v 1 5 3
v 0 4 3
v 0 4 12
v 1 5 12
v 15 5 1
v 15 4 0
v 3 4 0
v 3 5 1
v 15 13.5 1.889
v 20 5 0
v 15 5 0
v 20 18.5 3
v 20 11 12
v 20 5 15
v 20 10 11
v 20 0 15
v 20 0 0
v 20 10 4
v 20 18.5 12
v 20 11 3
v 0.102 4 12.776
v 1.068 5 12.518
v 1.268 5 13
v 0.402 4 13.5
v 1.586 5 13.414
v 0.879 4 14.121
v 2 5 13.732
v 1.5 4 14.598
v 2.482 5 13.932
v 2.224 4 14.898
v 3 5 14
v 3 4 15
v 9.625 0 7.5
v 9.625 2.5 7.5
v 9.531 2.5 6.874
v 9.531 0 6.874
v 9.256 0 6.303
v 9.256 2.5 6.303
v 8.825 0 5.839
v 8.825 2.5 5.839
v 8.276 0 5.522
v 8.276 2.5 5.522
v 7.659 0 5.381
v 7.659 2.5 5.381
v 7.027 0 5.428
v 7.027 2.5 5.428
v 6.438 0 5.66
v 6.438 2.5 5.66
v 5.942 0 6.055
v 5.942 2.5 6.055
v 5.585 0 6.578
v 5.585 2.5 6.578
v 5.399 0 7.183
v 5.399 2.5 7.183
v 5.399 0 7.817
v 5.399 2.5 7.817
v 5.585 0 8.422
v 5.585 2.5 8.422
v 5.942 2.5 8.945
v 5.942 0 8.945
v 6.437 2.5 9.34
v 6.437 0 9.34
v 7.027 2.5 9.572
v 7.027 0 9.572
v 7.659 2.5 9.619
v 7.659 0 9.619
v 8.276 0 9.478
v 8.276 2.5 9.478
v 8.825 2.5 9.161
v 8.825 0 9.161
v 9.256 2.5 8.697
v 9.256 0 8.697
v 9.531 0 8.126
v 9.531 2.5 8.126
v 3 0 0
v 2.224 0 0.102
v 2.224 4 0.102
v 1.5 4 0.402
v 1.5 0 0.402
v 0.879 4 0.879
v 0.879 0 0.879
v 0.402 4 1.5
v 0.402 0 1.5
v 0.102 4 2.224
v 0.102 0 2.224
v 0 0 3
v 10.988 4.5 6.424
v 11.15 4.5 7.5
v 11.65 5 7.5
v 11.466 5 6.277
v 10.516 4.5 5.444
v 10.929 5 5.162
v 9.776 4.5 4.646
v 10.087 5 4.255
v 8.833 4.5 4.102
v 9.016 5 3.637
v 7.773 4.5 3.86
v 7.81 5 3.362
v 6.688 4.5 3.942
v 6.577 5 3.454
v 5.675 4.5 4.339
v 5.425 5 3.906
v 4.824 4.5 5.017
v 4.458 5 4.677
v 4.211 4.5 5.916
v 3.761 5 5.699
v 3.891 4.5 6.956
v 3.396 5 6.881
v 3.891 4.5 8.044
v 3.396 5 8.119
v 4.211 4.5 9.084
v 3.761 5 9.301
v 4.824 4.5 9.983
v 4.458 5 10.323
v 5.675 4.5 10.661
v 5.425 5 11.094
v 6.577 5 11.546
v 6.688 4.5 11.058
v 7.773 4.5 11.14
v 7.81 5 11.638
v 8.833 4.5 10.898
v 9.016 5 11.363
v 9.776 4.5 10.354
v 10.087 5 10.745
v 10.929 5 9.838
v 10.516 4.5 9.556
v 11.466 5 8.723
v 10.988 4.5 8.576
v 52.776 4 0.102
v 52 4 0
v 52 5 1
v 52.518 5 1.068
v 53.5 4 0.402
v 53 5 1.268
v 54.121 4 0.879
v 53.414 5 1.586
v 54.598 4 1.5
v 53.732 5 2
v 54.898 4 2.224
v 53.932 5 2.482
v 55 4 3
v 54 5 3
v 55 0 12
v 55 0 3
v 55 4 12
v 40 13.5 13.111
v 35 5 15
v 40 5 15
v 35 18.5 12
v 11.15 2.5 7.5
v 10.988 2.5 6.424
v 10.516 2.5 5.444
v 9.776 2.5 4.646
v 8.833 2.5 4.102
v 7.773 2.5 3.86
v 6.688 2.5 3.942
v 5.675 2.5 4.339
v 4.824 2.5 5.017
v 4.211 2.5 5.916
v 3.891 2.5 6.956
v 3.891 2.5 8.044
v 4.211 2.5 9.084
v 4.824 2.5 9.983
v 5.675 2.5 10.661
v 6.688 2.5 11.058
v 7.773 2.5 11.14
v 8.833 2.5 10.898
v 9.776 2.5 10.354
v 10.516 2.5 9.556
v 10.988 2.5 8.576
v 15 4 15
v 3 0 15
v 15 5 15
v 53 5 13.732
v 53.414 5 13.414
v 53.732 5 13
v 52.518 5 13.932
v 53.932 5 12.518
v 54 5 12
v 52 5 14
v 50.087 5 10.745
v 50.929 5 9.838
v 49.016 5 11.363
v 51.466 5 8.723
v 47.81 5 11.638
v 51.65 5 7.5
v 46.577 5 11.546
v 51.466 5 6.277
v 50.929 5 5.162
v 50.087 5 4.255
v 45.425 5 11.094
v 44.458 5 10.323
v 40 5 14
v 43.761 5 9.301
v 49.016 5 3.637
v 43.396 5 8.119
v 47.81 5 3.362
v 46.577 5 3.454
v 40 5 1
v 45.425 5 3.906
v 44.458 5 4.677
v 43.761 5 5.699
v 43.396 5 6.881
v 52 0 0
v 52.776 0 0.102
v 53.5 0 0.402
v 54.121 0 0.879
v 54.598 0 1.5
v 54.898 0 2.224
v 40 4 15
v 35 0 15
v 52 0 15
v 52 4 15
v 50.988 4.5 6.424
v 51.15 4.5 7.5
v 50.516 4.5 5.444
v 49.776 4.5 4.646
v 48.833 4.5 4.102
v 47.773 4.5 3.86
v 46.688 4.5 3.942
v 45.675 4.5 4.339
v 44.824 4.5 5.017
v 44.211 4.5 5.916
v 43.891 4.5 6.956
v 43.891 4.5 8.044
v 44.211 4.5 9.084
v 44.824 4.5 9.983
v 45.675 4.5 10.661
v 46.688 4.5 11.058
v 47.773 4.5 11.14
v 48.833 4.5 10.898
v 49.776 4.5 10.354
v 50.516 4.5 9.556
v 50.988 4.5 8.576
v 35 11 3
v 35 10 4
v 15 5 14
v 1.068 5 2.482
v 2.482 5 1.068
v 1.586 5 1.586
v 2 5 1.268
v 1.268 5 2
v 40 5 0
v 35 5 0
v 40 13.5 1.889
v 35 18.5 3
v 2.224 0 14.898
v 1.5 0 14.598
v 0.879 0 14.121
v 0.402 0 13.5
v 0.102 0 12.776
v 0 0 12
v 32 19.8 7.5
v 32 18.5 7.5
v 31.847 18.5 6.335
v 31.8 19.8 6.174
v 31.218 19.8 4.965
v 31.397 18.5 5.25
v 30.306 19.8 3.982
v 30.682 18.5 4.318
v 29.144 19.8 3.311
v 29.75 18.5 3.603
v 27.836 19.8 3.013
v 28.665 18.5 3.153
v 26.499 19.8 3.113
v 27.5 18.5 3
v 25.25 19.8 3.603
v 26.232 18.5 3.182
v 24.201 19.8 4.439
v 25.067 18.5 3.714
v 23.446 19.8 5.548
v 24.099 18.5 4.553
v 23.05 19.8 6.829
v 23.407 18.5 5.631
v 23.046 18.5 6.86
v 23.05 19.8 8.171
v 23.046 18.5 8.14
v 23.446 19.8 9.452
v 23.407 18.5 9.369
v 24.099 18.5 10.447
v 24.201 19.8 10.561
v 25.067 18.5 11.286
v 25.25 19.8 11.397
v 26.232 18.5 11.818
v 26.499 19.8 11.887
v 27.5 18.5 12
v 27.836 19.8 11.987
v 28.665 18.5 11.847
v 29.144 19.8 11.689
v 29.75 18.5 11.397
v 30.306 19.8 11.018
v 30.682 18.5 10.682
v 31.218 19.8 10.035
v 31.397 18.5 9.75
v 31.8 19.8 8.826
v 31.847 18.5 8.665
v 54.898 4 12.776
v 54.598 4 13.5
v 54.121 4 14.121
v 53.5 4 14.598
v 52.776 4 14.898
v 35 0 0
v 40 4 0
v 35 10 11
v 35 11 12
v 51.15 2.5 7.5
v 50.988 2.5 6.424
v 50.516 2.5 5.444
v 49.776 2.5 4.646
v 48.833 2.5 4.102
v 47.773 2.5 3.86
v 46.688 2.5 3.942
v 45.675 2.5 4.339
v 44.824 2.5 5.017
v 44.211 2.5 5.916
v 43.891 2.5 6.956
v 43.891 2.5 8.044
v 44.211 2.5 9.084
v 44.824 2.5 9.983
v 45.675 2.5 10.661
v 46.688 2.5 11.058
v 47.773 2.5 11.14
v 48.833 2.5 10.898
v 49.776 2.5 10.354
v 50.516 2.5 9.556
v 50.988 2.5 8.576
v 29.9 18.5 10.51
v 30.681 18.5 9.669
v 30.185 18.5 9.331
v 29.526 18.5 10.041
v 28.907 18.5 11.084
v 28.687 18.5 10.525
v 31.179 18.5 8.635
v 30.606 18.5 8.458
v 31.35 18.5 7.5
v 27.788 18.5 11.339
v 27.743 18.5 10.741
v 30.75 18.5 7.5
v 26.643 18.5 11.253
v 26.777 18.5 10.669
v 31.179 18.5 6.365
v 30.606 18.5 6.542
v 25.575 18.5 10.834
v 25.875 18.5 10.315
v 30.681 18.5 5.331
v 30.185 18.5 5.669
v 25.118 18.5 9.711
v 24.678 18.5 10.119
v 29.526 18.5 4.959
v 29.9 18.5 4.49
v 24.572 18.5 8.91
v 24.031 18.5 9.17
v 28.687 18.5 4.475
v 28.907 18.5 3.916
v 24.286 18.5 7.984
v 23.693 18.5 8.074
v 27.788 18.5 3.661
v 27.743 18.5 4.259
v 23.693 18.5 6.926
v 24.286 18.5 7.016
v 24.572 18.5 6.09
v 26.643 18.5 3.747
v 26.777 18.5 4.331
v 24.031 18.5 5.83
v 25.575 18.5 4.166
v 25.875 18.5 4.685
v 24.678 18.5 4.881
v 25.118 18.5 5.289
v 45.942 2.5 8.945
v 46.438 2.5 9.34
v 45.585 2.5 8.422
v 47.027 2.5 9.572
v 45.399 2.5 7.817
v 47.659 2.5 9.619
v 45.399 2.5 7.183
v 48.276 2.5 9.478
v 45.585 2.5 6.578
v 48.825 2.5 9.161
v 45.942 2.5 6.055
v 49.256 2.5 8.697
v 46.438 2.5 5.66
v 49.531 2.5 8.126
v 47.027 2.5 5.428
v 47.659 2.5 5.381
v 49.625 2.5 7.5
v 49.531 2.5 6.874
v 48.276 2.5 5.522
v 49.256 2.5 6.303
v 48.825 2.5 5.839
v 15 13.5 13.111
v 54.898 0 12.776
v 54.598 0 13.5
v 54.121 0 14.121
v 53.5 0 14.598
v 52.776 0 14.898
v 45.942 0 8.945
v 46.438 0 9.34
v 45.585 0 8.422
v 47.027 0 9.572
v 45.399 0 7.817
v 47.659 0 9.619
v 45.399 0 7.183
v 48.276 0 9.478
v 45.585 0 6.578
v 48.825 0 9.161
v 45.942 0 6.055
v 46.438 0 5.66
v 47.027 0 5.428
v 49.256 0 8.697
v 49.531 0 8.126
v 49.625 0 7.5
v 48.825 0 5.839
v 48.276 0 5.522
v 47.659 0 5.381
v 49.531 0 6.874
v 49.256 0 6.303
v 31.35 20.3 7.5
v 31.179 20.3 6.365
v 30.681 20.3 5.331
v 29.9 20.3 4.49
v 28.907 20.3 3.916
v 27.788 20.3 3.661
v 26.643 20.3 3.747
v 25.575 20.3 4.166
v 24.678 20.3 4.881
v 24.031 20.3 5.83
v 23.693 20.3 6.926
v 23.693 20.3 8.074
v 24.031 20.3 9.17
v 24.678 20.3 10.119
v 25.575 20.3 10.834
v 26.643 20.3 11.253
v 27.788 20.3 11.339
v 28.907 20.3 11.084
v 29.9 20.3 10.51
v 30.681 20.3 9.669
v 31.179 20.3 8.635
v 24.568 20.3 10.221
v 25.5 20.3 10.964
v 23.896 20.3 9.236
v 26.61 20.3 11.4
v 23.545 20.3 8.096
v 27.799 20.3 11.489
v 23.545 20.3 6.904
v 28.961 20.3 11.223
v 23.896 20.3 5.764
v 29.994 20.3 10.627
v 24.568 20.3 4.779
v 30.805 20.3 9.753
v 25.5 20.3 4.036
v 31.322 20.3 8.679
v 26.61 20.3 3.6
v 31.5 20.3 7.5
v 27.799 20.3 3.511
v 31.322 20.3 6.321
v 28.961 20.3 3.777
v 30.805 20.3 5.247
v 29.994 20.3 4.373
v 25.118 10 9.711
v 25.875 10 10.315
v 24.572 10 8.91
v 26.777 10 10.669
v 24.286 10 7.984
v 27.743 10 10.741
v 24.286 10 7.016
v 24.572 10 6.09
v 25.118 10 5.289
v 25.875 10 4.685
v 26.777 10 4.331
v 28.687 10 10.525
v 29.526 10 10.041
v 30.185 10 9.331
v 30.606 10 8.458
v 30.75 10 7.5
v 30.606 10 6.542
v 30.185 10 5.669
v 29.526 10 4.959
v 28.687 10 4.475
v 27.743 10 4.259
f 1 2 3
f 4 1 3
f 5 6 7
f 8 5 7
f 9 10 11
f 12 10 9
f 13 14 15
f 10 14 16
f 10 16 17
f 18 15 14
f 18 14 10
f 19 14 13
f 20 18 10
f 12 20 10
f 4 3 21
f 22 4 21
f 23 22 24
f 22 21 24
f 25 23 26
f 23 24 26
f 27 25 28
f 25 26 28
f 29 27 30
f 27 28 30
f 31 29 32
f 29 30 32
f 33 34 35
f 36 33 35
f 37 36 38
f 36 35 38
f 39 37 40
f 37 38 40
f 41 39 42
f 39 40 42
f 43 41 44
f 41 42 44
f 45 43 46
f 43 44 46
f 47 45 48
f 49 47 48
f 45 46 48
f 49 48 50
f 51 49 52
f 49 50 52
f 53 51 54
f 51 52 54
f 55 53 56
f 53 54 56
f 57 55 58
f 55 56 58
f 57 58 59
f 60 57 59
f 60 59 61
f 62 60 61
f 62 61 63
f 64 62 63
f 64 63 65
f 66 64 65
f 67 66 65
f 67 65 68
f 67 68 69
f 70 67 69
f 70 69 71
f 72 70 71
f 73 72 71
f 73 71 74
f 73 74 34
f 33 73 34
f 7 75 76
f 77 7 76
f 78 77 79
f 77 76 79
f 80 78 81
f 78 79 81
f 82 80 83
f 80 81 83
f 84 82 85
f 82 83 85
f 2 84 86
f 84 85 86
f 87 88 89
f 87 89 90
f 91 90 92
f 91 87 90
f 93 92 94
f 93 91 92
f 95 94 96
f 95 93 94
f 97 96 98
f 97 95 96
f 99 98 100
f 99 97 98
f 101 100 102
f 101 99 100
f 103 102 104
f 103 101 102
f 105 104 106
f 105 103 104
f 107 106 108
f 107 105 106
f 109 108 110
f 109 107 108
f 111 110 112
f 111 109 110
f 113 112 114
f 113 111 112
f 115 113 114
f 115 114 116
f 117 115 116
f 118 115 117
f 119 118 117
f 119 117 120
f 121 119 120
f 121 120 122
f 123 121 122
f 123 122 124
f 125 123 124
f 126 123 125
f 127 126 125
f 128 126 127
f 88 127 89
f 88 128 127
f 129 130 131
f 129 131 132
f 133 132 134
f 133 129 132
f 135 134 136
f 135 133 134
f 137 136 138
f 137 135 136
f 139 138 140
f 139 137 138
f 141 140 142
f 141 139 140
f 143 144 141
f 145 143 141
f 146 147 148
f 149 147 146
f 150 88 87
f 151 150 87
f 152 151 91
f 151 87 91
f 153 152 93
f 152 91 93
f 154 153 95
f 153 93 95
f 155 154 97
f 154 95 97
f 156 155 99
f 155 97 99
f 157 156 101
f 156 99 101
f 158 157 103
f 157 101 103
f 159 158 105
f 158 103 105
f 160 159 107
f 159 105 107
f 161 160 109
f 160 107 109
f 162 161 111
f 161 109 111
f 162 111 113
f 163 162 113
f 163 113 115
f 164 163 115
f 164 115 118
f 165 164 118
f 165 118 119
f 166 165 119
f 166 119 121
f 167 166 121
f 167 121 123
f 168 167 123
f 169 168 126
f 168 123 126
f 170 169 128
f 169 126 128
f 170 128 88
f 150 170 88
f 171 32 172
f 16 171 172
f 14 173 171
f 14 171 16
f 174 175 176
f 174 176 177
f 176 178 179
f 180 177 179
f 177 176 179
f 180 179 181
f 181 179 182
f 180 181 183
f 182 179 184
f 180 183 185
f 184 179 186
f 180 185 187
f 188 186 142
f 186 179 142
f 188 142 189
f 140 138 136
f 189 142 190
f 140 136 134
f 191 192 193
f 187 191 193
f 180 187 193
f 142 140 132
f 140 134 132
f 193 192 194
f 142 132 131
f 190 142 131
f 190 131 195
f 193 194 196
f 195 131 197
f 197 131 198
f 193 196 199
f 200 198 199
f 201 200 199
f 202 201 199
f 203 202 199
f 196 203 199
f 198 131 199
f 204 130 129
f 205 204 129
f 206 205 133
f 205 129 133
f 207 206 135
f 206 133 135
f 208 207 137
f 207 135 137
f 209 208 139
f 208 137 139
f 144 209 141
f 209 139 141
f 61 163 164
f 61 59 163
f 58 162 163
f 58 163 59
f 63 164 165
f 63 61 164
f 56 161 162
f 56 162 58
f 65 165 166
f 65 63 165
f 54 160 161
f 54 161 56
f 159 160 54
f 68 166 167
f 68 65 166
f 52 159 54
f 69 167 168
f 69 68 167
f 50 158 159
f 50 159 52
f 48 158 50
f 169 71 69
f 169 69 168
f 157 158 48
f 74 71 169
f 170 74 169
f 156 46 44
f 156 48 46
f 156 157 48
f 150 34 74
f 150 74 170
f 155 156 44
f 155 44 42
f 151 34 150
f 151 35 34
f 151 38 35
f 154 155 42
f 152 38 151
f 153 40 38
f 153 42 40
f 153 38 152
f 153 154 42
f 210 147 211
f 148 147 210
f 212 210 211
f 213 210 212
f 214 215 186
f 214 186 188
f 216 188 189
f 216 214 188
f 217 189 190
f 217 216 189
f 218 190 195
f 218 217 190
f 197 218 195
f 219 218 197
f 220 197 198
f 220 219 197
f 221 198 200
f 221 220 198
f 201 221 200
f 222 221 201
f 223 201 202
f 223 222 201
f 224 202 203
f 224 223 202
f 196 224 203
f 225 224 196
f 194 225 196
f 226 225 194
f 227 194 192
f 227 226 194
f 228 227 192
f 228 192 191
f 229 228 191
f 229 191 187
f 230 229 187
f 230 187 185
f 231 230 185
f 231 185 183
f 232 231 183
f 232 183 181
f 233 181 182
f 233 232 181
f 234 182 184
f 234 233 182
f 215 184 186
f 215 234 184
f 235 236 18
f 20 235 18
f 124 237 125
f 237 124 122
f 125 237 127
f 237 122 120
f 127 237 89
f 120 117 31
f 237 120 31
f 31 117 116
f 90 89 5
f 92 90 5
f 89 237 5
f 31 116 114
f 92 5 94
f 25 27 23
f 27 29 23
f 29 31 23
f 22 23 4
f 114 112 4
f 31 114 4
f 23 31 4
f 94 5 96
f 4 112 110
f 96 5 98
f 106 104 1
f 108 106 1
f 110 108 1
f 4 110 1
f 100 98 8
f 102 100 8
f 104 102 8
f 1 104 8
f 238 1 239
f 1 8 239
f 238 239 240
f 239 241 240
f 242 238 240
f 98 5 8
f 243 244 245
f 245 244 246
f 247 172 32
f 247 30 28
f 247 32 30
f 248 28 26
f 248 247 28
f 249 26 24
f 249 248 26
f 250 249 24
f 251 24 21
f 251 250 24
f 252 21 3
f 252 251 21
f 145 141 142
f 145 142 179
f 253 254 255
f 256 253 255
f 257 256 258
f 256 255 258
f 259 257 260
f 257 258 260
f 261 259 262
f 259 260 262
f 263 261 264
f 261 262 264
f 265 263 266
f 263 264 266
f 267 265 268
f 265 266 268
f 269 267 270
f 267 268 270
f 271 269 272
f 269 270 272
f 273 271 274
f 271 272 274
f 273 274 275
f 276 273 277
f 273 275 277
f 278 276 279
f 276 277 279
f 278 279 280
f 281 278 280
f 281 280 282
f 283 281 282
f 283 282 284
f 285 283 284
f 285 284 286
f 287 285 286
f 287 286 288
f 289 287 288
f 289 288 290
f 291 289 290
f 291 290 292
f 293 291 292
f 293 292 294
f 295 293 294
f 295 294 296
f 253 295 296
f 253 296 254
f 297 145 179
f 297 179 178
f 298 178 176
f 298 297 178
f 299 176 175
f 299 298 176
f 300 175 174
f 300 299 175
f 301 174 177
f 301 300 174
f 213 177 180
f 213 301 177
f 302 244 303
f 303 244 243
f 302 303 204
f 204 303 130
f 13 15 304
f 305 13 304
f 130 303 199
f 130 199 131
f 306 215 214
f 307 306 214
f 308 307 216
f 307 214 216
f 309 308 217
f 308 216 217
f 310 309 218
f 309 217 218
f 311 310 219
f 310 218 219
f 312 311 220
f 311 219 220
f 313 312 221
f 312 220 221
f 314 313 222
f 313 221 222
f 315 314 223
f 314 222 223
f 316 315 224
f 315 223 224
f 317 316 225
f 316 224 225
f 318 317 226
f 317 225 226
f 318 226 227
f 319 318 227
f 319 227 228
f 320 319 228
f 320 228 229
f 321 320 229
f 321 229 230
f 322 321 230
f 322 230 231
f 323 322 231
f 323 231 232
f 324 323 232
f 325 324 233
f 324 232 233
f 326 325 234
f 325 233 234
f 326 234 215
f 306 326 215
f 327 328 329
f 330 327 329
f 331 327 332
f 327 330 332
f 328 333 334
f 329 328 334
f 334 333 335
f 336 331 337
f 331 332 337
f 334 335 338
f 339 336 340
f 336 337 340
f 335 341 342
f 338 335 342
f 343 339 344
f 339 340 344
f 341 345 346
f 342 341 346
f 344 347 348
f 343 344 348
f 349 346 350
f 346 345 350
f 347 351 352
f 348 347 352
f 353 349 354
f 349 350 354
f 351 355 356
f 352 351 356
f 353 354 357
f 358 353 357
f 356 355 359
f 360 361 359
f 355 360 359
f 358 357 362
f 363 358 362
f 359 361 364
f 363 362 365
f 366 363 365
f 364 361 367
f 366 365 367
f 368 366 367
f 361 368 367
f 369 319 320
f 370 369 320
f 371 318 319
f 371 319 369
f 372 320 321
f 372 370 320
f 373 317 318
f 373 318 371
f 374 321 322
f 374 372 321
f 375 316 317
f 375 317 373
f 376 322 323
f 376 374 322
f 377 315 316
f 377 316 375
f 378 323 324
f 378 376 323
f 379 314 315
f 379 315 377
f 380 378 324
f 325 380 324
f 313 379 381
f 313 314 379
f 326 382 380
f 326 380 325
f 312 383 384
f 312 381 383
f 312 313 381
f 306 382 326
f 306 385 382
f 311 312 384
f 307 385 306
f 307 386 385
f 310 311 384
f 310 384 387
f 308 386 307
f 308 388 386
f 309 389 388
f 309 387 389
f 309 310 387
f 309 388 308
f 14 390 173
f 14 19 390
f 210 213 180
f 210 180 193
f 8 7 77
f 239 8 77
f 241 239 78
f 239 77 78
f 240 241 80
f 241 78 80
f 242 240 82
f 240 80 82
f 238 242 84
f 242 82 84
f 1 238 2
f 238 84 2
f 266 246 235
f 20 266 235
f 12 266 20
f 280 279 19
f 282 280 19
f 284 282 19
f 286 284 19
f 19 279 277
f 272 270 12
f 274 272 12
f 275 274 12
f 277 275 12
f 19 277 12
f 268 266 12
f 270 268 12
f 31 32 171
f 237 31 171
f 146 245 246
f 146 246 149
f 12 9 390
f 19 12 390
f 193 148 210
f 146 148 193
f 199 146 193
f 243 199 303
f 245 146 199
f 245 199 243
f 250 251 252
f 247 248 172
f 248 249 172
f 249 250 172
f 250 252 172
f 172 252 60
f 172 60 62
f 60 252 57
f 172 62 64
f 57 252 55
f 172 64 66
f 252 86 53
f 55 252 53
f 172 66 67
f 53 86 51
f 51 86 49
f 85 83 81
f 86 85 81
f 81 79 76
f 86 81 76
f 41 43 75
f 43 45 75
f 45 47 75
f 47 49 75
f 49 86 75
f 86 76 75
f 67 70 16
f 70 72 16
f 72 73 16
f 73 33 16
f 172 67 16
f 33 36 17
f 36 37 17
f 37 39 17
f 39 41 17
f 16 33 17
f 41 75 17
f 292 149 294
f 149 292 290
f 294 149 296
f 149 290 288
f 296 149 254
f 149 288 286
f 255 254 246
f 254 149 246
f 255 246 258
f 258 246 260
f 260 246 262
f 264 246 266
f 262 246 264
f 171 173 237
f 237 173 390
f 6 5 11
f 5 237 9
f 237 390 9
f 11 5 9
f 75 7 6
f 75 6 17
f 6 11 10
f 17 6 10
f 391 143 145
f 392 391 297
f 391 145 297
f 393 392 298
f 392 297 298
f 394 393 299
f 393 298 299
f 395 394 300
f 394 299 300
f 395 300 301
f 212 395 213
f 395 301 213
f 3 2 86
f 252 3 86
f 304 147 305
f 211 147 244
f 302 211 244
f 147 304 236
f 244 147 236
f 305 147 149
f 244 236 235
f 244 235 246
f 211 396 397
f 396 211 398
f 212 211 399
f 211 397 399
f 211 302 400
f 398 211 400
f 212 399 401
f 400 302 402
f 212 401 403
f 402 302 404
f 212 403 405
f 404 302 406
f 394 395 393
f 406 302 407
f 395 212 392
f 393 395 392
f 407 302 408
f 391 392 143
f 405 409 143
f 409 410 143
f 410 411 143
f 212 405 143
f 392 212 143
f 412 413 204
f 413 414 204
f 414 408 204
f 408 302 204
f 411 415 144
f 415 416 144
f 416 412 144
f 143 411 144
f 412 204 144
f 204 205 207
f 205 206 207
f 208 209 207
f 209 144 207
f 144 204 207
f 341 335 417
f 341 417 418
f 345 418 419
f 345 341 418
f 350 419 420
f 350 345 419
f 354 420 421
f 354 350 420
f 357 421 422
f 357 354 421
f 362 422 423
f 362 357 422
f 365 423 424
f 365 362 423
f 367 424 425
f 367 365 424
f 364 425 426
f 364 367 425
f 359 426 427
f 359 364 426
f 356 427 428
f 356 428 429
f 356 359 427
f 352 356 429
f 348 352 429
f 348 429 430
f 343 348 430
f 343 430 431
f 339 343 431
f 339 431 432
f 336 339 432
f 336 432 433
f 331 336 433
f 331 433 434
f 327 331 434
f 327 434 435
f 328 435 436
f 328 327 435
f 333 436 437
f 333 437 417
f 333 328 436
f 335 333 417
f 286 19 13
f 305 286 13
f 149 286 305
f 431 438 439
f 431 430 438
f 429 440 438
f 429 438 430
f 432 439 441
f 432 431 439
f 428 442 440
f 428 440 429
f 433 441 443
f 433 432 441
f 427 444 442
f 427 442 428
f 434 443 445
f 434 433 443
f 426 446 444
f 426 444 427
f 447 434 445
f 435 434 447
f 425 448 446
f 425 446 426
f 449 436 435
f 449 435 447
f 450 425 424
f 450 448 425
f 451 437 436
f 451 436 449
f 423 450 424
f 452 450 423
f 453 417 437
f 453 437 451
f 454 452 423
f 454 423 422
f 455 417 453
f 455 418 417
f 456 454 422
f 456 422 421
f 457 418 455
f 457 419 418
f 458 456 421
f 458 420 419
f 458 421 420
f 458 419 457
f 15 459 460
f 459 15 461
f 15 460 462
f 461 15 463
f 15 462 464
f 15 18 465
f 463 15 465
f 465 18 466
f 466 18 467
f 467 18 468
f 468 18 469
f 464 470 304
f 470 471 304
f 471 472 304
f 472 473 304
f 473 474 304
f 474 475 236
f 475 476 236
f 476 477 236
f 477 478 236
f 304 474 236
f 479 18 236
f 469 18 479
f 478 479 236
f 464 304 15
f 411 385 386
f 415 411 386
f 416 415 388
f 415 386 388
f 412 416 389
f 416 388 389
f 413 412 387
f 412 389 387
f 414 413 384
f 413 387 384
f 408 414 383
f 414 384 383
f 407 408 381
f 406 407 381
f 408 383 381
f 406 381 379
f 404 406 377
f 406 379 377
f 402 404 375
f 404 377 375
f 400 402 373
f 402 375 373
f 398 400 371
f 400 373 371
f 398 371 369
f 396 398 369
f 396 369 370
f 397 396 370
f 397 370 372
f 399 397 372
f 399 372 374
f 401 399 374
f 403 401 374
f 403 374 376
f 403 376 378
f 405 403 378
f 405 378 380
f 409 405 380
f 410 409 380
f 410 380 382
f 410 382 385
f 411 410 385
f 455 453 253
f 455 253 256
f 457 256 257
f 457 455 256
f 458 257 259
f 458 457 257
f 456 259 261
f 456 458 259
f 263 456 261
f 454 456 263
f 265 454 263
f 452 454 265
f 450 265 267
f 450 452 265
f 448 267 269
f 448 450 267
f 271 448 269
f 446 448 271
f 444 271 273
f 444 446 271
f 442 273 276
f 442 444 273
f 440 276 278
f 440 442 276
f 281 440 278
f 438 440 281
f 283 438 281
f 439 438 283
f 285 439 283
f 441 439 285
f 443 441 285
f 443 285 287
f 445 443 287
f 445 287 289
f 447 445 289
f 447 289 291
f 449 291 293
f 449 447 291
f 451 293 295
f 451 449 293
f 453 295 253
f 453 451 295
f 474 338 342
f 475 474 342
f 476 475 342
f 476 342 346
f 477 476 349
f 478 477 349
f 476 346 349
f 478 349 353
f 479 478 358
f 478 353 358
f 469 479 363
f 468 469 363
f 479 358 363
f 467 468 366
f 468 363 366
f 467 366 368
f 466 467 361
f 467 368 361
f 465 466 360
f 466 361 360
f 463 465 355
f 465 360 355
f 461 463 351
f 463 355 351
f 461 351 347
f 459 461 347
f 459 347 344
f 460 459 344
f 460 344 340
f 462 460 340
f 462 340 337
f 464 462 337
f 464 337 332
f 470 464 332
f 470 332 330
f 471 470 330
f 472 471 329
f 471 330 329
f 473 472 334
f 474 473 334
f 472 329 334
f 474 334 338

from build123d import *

# Parameters (mm, degrees)
BOSS_EXTRUDE1_DEPTH = 15
SKETCH2_W           = 25
SKETCH2_H           = 13.5
CUT_EXTRUDE1_DEPTH  = 3
SKETCH3_W           = 25
SKETCH3_H           = 13.5
CUT_EXTRUDE2_DEPTH  = 3
BOSS_EXTRUDE2_DEPTH = 5
BOSS_EXTRUDE3_DEPTH = 5
SKETCH6_R           = 3.25
CUT_EXTRUDE3_DEPTH  = 8.5
SKETCH7_R           = 2.125
CUT_EXTRUDE4_DEPTH  = 5
SKETCH8_R           = 3.65
CUT_EXTRUDE5_DEPTH  = 2.5
CHAMFER3_SIZE       = 0.5
FILLET1_R           = 3
SKETCH9_R           = 4.5
SKETCH9_R_2         = 3.85
BOSS_EXTRUDE4_DEPTH = 1.8
CHAMFER4_SIZE       = 5
CHAMFER5_SIZE       = 1
CHAMFER6_SIZE       = 0.5


with BuildPart() as part:
    # Sketch1 → Boss-Extrude1 (new body)
    with BuildSketch(Plane.XY):
        Polygon((0, 0), (20, 0), (20, 10), (35, 10), (35, 0), (55, 0), (55, 5), (40, 5), (40, 18.5), (15, 18.5), (15, 5), (0, 5), align=None)
    extrude(amount=BOSS_EXTRUDE1_DEPTH)

    # Sketch2 → Cut-Extrude1 (cut)
    with BuildSketch(Plane.XY.offset(15)):
        with Locations((27.5, 11.75)):
            Rectangle(SKETCH2_W, SKETCH2_H)
    extrude(amount=-CUT_EXTRUDE1_DEPTH, mode=Mode.SUBTRACT)

    # Sketch3 → Cut-Extrude2 (cut)
    with BuildSketch(Plane(origin=(0, 0, 0), x_dir=(-1, 0, 0), z_dir=(0, 0, -1))):
        with Locations((-27.5, 11.75)):
            Rectangle(SKETCH3_W, SKETCH3_H)
    extrude(amount=-CUT_EXTRUDE2_DEPTH, mode=Mode.SUBTRACT)

    # Sketch4 → Boss-Extrude2 (add)
    with BuildSketch(Plane(origin=(20, 0, 0), x_dir=(0, 0, -1), z_dir=(1, 0, 0))):
        Polygon((-12, 18.5), (-15, 5), (-12, 5), align=None)
        Polygon((-3, 5), (0, 5), (-3, 18.5), align=None)
    extrude(amount=-BOSS_EXTRUDE2_DEPTH)

    # Sketch5 → Boss-Extrude3 (add)
    with BuildSketch(Plane.ZY.offset(-35)):
        Polygon((0, 5), (3, 18.5), (3, 5), align=None)
        Polygon((12, 18.5), (12, 5), (15, 5), align=None)
    extrude(amount=-BOSS_EXTRUDE3_DEPTH)

    # Sketch6 → Cut-Extrude3 (cut)
    with BuildSketch(Plane(origin=(0, 18.5, 0), x_dir=(1, 0, 0), z_dir=(0, 1, 0))):
        with Locations((27.5, -7.5)):
            Circle(SKETCH6_R)
    extrude(amount=-CUT_EXTRUDE3_DEPTH, mode=Mode.SUBTRACT)

    # Sketch7 → Cut-Extrude4 (cut)
    with BuildSketch(Plane(origin=(0, 5, 0), x_dir=(1, 0, 0), z_dir=(0, 1, 0))):
        with Locations((7.5, -7.5)):
            Circle(SKETCH7_R)
        with Locations((47.5, -7.5)):
            Circle(SKETCH7_R)
    extrude(amount=-CUT_EXTRUDE4_DEPTH, mode=Mode.SUBTRACT)

    # Sketch8 → Cut-Extrude5 (cut)
    with BuildSketch(Plane(origin=(0, 5, 0), x_dir=(1, 0, 0), z_dir=(0, 1, 0))):
        with Locations((7.5, -7.5)):
            Circle(SKETCH8_R)
        with Locations((47.5, -7.5)):
            Circle(SKETCH8_R)
    extrude(amount=-CUT_EXTRUDE5_DEPTH, mode=Mode.SUBTRACT)

    # Chamfer3
    chamfer3_edges = [part.edges().sort_by_distance(p)[0] for p in [
        (3.85, 5, 7.5),
        (43.85, 5, 7.5),
    ]]
    chamfer(chamfer3_edges, length=CHAMFER3_SIZE)

    # Fillet1
    fillet1_edges = [part.edges().sort_by_distance(p)[0] for p in [
        (55, 2.5, 0),
        (0, 2.5, 0),
        (55, 2.5, 15),
        (0, 2.5, 15),
    ]]
    fillet(fillet1_edges, radius=FILLET1_R)

    # Sketch9 → Boss-Extrude4 (add)
    with BuildSketch(Plane(origin=(0, 18.5, 0), x_dir=(1, 0, 0), z_dir=(0, 1, 0))):
        with Locations((27.5, -7.5)):
            Circle(SKETCH9_R)
        with Locations((27.5, -7.5)):
            Circle(SKETCH9_R_2, mode=Mode.SUBTRACT)
    extrude(amount=BOSS_EXTRUDE4_DEPTH)

    # Chamfer4
    chamfer4_edges = [part.edges().sort_by_distance(p)[0] for p in [
        (40, 18.5, 7.5),
        (15, 18.5, 7.5),
    ]]
    chamfer(chamfer4_edges, length=CHAMFER4_SIZE)

    # Chamfer5
    chamfer5_edges = [part.edges().sort_by_distance(p)[0] for p in [
        (0, 5, 7.5),
        (0.878679656, 5, 14.121320344),
        (0.878679656, 5, 0.878679656),
        (55, 5, 7.5),
        (46, 5, 15),
        (46, 5, 0),
        (54.121320344, 5, 14.121320344),
        (54.121320344, 5, 0.878679656),
        (27.5, 10, 12),
        (27.5, 10, 3),
        (9, 5, 15),
        (9, 5, 0),
    ]]
    chamfer(chamfer5_edges, length=CHAMFER5_SIZE)

    # Chamfer6
    chamfer6_edges = [part.edges().sort_by_distance(p)[0] for p in [
        (23, 20.3, 7.5),
    ]]
    chamfer(chamfer6_edges, length=CHAMFER6_SIZE)


solid = part.part
